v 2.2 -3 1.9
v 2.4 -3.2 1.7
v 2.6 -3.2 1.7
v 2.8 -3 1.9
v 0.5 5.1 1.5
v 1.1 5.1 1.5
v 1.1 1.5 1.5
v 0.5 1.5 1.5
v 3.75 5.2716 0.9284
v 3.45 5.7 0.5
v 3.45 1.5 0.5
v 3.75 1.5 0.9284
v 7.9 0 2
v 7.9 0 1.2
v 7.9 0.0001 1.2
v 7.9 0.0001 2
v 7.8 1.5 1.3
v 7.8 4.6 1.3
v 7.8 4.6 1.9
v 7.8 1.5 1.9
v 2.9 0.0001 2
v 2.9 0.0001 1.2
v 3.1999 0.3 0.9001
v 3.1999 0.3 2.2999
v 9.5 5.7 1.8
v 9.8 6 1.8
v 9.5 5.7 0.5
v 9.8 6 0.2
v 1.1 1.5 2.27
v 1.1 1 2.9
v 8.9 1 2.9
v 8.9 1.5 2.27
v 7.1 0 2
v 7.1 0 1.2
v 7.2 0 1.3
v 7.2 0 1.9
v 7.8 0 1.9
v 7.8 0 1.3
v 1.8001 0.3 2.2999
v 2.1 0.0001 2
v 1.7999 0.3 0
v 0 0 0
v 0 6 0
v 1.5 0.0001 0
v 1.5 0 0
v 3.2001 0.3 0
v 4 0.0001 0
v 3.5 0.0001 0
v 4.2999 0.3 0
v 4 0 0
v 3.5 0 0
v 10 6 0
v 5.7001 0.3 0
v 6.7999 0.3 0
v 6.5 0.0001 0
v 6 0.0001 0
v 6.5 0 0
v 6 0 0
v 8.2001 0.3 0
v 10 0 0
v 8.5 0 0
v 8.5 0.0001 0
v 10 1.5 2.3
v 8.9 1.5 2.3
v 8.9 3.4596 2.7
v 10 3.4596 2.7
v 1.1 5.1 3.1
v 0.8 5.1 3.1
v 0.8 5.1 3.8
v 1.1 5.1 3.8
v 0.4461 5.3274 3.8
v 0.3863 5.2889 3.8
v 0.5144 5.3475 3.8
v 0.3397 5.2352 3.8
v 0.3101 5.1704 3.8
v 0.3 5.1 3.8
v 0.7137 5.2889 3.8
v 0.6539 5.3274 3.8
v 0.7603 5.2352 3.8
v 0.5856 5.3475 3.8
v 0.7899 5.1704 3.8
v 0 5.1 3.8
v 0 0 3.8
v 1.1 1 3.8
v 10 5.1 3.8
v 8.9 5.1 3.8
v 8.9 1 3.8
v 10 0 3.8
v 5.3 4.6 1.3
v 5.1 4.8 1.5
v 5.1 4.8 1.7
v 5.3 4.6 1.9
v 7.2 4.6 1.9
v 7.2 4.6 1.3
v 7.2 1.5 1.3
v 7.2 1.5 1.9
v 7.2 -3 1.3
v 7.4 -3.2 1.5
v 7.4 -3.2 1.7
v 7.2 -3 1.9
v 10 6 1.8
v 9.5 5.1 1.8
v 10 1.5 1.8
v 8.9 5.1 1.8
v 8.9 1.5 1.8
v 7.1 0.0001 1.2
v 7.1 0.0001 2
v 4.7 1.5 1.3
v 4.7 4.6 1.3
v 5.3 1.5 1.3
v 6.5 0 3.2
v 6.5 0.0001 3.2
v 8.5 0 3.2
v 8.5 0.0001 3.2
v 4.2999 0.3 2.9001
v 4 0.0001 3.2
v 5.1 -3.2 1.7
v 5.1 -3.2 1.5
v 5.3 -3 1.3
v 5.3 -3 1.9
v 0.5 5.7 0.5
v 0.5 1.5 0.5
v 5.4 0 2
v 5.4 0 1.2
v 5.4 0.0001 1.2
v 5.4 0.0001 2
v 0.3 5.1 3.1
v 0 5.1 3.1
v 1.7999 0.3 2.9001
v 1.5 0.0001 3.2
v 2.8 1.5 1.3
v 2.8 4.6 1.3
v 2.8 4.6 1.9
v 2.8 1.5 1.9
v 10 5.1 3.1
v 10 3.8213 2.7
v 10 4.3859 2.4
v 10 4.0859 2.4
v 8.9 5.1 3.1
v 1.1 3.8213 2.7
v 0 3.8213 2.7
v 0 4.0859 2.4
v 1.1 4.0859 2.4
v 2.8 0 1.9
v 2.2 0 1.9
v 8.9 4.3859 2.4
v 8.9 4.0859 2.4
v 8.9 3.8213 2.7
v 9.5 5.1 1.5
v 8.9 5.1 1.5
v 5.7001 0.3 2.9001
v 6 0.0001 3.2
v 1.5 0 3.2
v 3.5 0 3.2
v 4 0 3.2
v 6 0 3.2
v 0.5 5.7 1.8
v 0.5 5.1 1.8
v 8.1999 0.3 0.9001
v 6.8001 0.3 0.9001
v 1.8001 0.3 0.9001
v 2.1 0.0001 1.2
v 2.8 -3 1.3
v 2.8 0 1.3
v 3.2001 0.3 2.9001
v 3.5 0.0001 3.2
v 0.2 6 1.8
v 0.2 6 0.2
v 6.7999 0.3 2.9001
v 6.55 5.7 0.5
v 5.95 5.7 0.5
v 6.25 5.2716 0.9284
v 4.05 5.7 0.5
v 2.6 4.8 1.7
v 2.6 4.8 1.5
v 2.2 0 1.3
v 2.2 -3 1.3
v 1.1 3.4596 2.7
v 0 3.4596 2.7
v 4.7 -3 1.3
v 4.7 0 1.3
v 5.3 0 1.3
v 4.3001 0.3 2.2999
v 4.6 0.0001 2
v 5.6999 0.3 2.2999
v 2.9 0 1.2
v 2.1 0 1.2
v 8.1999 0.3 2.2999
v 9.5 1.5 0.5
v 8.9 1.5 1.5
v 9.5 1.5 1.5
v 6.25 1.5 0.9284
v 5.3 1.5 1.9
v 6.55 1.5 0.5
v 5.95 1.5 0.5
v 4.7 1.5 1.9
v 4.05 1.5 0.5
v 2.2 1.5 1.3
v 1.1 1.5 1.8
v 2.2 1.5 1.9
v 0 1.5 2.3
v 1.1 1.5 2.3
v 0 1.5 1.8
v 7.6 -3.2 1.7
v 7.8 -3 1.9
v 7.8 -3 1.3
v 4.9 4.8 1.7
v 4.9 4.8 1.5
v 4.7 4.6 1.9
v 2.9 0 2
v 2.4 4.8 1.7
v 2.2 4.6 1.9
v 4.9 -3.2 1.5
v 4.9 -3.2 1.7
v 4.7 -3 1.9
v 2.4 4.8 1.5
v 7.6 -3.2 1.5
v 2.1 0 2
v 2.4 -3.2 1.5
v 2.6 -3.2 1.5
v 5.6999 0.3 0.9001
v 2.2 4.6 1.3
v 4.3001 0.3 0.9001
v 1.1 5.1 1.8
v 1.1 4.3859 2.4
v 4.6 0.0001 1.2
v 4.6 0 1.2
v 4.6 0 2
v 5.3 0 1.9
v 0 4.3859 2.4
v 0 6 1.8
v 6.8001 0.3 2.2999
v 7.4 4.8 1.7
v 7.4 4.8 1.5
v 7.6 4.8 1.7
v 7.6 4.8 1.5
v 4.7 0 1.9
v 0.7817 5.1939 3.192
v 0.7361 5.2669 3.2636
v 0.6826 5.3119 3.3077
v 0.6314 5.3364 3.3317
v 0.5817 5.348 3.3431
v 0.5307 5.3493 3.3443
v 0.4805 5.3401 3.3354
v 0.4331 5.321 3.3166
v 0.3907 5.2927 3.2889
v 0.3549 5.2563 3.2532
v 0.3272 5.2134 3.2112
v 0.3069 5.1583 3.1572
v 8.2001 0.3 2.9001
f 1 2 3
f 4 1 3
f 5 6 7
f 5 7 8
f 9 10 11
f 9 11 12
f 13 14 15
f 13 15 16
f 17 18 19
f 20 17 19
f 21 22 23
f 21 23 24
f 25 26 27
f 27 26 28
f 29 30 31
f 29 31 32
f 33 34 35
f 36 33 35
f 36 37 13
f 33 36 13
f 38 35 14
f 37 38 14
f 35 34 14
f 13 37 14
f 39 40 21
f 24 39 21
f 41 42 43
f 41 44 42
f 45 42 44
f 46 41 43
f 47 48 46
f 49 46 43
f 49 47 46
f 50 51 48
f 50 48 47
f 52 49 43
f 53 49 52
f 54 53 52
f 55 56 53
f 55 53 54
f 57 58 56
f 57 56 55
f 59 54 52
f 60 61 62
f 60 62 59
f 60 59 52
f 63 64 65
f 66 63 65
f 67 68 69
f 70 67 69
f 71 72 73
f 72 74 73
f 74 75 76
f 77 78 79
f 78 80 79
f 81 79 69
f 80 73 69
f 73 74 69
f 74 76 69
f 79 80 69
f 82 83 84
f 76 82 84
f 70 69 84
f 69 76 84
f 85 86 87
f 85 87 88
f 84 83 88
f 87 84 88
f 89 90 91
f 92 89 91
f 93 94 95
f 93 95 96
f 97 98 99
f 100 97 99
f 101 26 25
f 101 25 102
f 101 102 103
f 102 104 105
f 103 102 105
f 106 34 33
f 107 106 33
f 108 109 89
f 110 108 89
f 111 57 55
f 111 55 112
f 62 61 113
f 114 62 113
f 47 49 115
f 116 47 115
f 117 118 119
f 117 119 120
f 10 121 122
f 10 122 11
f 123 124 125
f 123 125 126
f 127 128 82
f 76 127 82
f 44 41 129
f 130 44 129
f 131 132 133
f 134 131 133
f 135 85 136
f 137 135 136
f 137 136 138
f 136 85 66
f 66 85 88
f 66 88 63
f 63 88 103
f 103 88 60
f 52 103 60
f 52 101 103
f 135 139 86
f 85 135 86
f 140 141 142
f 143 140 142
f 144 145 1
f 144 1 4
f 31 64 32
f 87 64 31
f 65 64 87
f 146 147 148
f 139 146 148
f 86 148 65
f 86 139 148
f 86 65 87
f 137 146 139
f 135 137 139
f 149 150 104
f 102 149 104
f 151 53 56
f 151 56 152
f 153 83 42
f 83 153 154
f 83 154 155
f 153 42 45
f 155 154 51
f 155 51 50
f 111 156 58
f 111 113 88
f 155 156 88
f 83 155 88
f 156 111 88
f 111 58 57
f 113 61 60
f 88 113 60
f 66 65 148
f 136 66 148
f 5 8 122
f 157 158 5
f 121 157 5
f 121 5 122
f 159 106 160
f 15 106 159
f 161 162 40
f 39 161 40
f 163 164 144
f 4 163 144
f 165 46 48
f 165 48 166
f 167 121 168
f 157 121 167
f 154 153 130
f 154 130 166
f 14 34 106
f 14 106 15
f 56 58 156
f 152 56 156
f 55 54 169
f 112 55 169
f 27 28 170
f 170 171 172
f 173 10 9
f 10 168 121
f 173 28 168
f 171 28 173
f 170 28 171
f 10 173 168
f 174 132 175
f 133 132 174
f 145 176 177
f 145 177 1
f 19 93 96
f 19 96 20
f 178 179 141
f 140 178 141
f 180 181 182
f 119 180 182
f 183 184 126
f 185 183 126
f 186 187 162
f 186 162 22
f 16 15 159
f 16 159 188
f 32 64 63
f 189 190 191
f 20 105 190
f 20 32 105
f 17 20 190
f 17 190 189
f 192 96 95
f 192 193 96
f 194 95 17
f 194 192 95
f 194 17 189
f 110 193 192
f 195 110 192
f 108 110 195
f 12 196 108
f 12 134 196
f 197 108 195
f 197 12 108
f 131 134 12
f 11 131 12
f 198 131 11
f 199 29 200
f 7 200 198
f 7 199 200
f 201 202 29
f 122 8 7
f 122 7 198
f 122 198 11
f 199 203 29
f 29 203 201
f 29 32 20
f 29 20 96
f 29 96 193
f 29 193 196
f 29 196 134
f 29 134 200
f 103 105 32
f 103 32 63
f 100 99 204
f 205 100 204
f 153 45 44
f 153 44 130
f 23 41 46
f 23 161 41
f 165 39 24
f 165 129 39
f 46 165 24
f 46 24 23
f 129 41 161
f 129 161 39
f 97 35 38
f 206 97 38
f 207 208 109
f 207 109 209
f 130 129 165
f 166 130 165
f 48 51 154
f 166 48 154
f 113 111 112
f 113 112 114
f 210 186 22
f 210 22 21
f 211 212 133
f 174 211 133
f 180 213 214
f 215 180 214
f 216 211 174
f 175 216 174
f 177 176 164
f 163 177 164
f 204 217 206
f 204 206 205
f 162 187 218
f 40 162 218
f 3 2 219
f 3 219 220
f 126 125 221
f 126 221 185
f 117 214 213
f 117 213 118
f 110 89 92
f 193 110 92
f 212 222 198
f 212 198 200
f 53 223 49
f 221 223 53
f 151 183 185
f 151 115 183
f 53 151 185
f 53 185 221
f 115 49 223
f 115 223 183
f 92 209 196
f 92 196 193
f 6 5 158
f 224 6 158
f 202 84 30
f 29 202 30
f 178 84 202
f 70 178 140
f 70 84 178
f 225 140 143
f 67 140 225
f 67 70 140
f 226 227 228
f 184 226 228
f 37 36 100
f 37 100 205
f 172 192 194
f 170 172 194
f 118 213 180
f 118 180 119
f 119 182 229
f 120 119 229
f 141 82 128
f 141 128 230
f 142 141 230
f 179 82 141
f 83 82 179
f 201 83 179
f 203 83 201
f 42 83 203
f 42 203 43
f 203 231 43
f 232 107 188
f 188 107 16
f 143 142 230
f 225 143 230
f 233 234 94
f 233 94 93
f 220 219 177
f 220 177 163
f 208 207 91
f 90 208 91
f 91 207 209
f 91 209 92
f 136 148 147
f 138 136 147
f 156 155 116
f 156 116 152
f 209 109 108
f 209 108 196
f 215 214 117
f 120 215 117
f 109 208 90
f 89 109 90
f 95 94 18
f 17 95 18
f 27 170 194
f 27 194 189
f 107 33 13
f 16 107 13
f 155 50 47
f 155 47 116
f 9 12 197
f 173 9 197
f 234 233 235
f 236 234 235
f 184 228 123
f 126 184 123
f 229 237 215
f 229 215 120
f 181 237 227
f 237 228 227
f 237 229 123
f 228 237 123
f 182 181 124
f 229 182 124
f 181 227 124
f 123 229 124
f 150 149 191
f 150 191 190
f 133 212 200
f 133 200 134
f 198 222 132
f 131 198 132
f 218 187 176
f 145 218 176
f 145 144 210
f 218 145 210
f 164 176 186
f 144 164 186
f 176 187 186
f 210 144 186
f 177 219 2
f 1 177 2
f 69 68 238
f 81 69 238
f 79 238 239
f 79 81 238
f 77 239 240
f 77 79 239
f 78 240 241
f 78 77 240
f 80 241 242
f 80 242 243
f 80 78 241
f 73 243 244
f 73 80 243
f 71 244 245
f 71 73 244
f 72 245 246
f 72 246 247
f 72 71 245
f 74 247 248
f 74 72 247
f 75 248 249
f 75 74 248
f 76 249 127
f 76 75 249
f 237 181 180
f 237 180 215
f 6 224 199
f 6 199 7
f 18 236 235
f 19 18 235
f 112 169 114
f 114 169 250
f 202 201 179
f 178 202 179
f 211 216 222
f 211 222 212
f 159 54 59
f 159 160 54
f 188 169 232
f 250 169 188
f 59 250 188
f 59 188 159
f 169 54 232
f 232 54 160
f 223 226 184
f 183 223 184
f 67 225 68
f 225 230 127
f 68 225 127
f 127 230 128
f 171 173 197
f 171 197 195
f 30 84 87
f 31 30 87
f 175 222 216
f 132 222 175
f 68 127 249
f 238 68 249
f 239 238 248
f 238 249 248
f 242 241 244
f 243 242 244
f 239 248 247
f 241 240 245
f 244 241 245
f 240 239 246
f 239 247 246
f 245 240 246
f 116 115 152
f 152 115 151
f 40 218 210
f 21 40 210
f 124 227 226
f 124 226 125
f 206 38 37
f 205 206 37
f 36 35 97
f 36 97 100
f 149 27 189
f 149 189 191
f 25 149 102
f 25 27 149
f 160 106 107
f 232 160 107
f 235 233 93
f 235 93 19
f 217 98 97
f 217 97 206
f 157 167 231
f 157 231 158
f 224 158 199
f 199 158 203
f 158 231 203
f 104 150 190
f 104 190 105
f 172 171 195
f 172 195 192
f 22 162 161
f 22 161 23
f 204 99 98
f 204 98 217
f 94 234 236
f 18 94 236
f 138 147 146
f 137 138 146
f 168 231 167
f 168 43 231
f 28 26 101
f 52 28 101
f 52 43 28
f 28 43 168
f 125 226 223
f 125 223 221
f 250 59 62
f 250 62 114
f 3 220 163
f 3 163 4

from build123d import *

# Parameters (mm, degrees)
SKETCH_1_W                         = 10
SKETCH_1_H                         = 3.8
EXTRUDE_1_DEPTH                    = 6
CUT_EXTRUDE_1_DEPTH                = 5
CUT_EXTRUDE_2_DEPTH                = 13.265398485
EXTRUDE_2_REACH                    = 14.265
CUT_EXTRUDE_3_REACH                = 14.265
SKETCH_5_W                         = 7.8
SKETCH_5_H                         = 4.1
EXTRUDE_3_REACH                    = 13.861
EXTRUDE_5_REACH                    = 14.265
SKETCH_11_W                        = 2
SKETCH_11_H                        = 3.2
SKETCH_11_W_2                      = 0.8
SKETCH_11_H_2                      = 0.8
CUT_EXTRUDE_5_DEPTH                = 0.3
SKETCH_15_R                        = 0.05
CUT_EXTRUDE_6_DEPTH                = 0.1
CHAMFER_7_SIZE                     = 0.3
PATTERN_LINEAR_2_COUNT             = 2
PATTERN_LINEAR_2_PITCH             = 2.5
EXTRUDE_START                      = -4.8
SKETCH_7_W                         = 0.6
SKETCH_7_H                         = 0.6
EXTRUDE_4_DEPTH                    = 8
CHAMFER_6_SIZE                     = 0.2
PATTERN_LINEAR_1_COUNT             = 3
PATTERN_LINEAR_1_PITCH             = 2.5
CHAMFER_7_OF_PATTERN_LINEAR_1_SIZE = 0.3
CHAMFER_6_OF_PATTERN_LINEAR_1_SIZE = 0.2
CUT_EXTRUDE_4_REACH                = 13.861
CHAMFER_5_SIZE                     = 0.3


with BuildPart() as part:
    # Эскиз1 → Бобышка-Вытянуть1 (new body)
    with BuildSketch(Plane(origin=(0, 0, 0), x_dir=(1, 0, 0), z_dir=(0, 1, 0))):
        with Locations((5, -1.9)):
            Rectangle(SKETCH_1_W, SKETCH_1_H)
    extrude(amount=EXTRUDE_1_DEPTH)

    # Эскиз2 → Вырез-Вытянуть1 (cut)
    with BuildSketch(Plane(origin=(0, 6, 0), x_dir=(1, 0, 0), z_dir=(0, 1, 0))):
        Polygon((0.5, -0.5), (9.5, -0.5), (9.5, -1.5), (8.9, -1.5), (8.9, -3.3), (1.1, -3.3), (1.1, -1.5), (0.5, -1.5), align=None)
    extrude(amount=-CUT_EXTRUDE_1_DEPTH, mode=Mode.SUBTRACT)

    # Эскиз3 → Вырез-Вытянуть2 (cut, through all)
    with BuildSketch(Plane.ZY):
        Polygon((1.8, 6), (1.8, 1.5), (2.3, 1.5), (2.7, 3.459591794), (2.7, 3.821282026), (2.4, 4.085857157), (2.4, 4.385857157), (3.1, 5.1), (3.8, 5.1), (3.8, 6), align=None)
    extrude(amount=-CUT_EXTRUDE_2_DEPTH, mode=Mode.SUBTRACT)

    # Бобышка-Вытянуть2: up to this plane
    extrude_2_end = Plane(origin=(10, 5.1, 3.1), z_dir=(0, -0.6999999999999996, 0.7141428428542854))
    # Эскиз4 → Бобышка-Вытянуть2 (add, up to the surface)
    with BuildSketch(Plane.XY.offset(3.8), mode=Mode.PRIVATE) as extrude_2_sk1:
        with BuildLine():
            Line((0.3, 5.1), (0.8, 5.1))
            ThreePointArc((0.8, 5.1), (0.55, 5.35), (0.3, 5.1))
        make_face()
    extrude_2_tool1 = split(extrude(extrude_2_sk1.sketch, amount=-EXTRUDE_2_REACH, mode=Mode.PRIVATE), bisect_by=extrude_2_end, keep=Keep.BOTH, mode=Mode.PRIVATE)
    add(extrude_2_tool1.solids().sort_by_distance((0.55, 5.206103, 3.8))[0])

    # Эскиз5 → Вырез-Вытянуть3 (cut, up to next)
    with BuildSketch(Plane.XY.offset(3.8), mode=Mode.PRIVATE) as cut_extrude_3_sk1:
        with Locations((5, 3.05)):
            Rectangle(SKETCH_5_W, SKETCH_5_H)
    cut_extrude_3_tool1 = extrude(cut_extrude_3_sk1.sketch, amount=-CUT_EXTRUDE_3_REACH, mode=Mode.PRIVATE) & part.part
    add(cut_extrude_3_tool1.solids().sort_by_distance((5, 3.05, 3.8))[0], mode=Mode.SUBTRACT)

    # Эскиз6 → Бобышка-Вытянуть3 (add, up to next)
    with BuildSketch(Plane(origin=(0.5, 0, 0), x_dir=(0, 0, -1), z_dir=(1, 0, 0)), mode=Mode.PRIVATE) as extrude_3_sk1:
        Polygon((-2.9, 1), (-2.27, 1.5), (-0.5, 1.5), (-0.5, 1), align=None)
    extrude_3_tool1 = extrude(extrude_3_sk1.sketch, amount=EXTRUDE_3_REACH, mode=Mode.PRIVATE) - part.part
    add(extrude_3_tool1.solids().sort_by_distance((0.5, 1.23741, 1.550432))[0])

    # Эскиз9 → Бобышка-Вытянуть5 (add, up to next)
    with BuildSketch(Plane(origin=(0, 6, 0), x_dir=(1, 0, 0), z_dir=(0, 1, 0)), mode=Mode.PRIVATE) as extrude_5_sk1:
        Polygon((3.45, -0.5), (3.75, -0.928444402), (4.05, -0.5), align=None)
    extrude_5_tool1 = extrude(extrude_5_sk1.sketch, amount=-EXTRUDE_5_REACH, mode=Mode.PRIVATE) - part.part
    extrude_5 = extrude_5_tool1.solids().sort_by_distance((3.75, 6, 0.642815))[0]
    add(extrude_5)

    # Эскиз11 → Вырез-Вытянуть5 (cut)
    with BuildSketch(Plane.XZ):
        with Locations((2.5, 1.6)):
            Rectangle(SKETCH_11_W, SKETCH_11_H)
        with Locations((2.5, 1.6)):
            Rectangle(SKETCH_11_W_2, SKETCH_11_H_2, mode=Mode.SUBTRACT)
    cut_extrude_5 = extrude(amount=-CUT_EXTRUDE_5_DEPTH, mode=Mode.SUBTRACT)

    # Эскиз15 → Вырез-Вытянуть6 (cut)
    with BuildSketch(Plane.XZ):
        with Locations(Location((2.5, 1.6, 0), (0, 0, 270))):
            Circle(SKETCH_15_R)
    extrude(amount=-CUT_EXTRUDE_6_DEPTH, mode=Mode.SUBTRACT)

    # Фаска7
    chamfer_7_edges = [part.edges().sort_by_distance(p)[0] for p in [
        (1.5, 0.3, 1.6),
        (2.5, 0.3, 3.2),
        (3.5, 0.3, 1.6),
        (2.9, 0.3, 1.6),
        (2.5, 0.3, 2),
        (2.1, 0.3, 1.6),
        (2.5, 0.3, 1.2),
    ]]
    chamfer(chamfer_7_edges, length=CHAMFER_7_SIZE - 0.0001)  # a hair under: the kernel refuses the full size

    # Линейный массив2: Бобышка-Вытянуть5 ×2
    with Locations(*[(i * PATTERN_LINEAR_2_PITCH, 0, 0) for i in range(1, PATTERN_LINEAR_2_COUNT)]):
        add(extrude_5)

    # Эскиз7 → Бобышка-Вытянуть4 (add)
    with BuildSketch(Plane.XZ.offset(EXTRUDE_START)):
        with Locations((2.5, 1.6)):
            Rectangle(SKETCH_7_W, SKETCH_7_H)
    extrude_4 = extrude(amount=EXTRUDE_4_DEPTH)

    # Фаска6
    chamfer_6_edges = [part.edges().sort_by_distance(p)[0] for p in [
        (2.8, 4.8, 1.6),
        (2.5, 4.8, 1.9),
        (2.2, 4.8, 1.6),
        (2.5, 4.8, 1.3),
        (2.8, -3.2, 1.6),
        (2.5, -3.2, 1.9),
        (2.2, -3.2, 1.6),
        (2.5, -3.2, 1.3),
    ]]
    chamfer(chamfer_6_edges, length=CHAMFER_6_SIZE)

    # Линейный массив1: Вырез-Вытянуть5, Бобышка-Вытянуть4 ×3
    with Locations(*[(i * PATTERN_LINEAR_1_PITCH, 0, 0) for i in range(1, PATTERN_LINEAR_1_COUNT)]):
        add(cut_extrude_5, mode=Mode.SUBTRACT)
        add(extrude_4)

    # Фаска7 of Линейный массив1
    chamfer_7_of_pattern_linear_1_edges = [part.edges().sort_by_distance(p)[0] for p in [
        (4, 0.3, 1.6),
        (5, 0.3, 3.2),
        (6, 0.3, 1.6),
        (5.4, 0.3, 1.6),
        (5, 0.3, 2),
        (4.6, 0.3, 1.6),
        (5, 0.3, 1.2),
        (6.5, 0.3, 1.6),
        (7.5, 0.3, 3.2),
        (8.5, 0.3, 1.6),
        (7.9, 0.3, 1.6),
        (7.5, 0.3, 2),
        (7.1, 0.3, 1.6),
        (7.5, 0.3, 1.2),
    ]]
    chamfer(chamfer_7_of_pattern_linear_1_edges, length=CHAMFER_7_OF_PATTERN_LINEAR_1_SIZE - 0.0001)  # a hair under: the kernel refuses the full size

    # Фаска6 of Линейный массив1
    chamfer_6_of_pattern_linear_1_edges = [part.edges().sort_by_distance(p)[0] for p in [
        (5.3, 4.8, 1.6),
        (5, 4.8, 1.9),
        (4.7, 4.8, 1.6),
        (5, 4.8, 1.3),
        (5.3, -3.2, 1.6),
        (5, -3.2, 1.9),
        (4.7, -3.2, 1.6),
        (5, -3.2, 1.3),
        (7.8, 4.8, 1.6),
        (7.5, 4.8, 1.9),
        (7.2, 4.8, 1.6),
        (7.5, 4.8, 1.3),
        (7.8, -3.2, 1.6),
        (7.5, -3.2, 1.9),
        (7.2, -3.2, 1.6),
        (7.5, -3.2, 1.3),
    ]]
    chamfer(chamfer_6_of_pattern_linear_1_edges, length=CHAMFER_6_OF_PATTERN_LINEAR_1_SIZE)

    # Вырез-Вытянуть4: up to this face of the body (flat: up to its plane)
    cut_extrude_4_end = Plane(part.part.faces().sort_by_distance((9.5, 3.75, 1))[0])
    # Эскиз10 → Вырез-Вытянуть4 (cut, up to the picked face)
    with BuildSketch(Plane(origin=(0.5, 0, 0), x_dir=(0, 0, -1), z_dir=(1, 0, 0)), mode=Mode.PRIVATE) as cut_extrude_4_sk1:
        Polygon((-1, 6), (-0.2, 6), (-1, 5.2), (-1, 5.1), (-1.8, 5.1), (-1.8, 6), align=None)
    cut_extrude_4_tool1 = split(extrude(cut_extrude_4_sk1.sketch, amount=CUT_EXTRUDE_4_REACH, mode=Mode.PRIVATE), bisect_by=cut_extrude_4_end, keep=Keep.BOTH, mode=Mode.PRIVATE)
    add(cut_extrude_4_tool1.solids().sort_by(Axis((0.5, 5.60641, 1.194872), (1, 0, 0)))[0], mode=Mode.SUBTRACT)

    # Фаска5
    chamfer_5_edges = [part.edges().sort_by_distance(p)[0] for p in [
        (9.5, 6, 1),
        (0.5, 6, 1),
    ]]
    chamfer(chamfer_5_edges, length=CHAMFER_5_SIZE)


solid = part.part
